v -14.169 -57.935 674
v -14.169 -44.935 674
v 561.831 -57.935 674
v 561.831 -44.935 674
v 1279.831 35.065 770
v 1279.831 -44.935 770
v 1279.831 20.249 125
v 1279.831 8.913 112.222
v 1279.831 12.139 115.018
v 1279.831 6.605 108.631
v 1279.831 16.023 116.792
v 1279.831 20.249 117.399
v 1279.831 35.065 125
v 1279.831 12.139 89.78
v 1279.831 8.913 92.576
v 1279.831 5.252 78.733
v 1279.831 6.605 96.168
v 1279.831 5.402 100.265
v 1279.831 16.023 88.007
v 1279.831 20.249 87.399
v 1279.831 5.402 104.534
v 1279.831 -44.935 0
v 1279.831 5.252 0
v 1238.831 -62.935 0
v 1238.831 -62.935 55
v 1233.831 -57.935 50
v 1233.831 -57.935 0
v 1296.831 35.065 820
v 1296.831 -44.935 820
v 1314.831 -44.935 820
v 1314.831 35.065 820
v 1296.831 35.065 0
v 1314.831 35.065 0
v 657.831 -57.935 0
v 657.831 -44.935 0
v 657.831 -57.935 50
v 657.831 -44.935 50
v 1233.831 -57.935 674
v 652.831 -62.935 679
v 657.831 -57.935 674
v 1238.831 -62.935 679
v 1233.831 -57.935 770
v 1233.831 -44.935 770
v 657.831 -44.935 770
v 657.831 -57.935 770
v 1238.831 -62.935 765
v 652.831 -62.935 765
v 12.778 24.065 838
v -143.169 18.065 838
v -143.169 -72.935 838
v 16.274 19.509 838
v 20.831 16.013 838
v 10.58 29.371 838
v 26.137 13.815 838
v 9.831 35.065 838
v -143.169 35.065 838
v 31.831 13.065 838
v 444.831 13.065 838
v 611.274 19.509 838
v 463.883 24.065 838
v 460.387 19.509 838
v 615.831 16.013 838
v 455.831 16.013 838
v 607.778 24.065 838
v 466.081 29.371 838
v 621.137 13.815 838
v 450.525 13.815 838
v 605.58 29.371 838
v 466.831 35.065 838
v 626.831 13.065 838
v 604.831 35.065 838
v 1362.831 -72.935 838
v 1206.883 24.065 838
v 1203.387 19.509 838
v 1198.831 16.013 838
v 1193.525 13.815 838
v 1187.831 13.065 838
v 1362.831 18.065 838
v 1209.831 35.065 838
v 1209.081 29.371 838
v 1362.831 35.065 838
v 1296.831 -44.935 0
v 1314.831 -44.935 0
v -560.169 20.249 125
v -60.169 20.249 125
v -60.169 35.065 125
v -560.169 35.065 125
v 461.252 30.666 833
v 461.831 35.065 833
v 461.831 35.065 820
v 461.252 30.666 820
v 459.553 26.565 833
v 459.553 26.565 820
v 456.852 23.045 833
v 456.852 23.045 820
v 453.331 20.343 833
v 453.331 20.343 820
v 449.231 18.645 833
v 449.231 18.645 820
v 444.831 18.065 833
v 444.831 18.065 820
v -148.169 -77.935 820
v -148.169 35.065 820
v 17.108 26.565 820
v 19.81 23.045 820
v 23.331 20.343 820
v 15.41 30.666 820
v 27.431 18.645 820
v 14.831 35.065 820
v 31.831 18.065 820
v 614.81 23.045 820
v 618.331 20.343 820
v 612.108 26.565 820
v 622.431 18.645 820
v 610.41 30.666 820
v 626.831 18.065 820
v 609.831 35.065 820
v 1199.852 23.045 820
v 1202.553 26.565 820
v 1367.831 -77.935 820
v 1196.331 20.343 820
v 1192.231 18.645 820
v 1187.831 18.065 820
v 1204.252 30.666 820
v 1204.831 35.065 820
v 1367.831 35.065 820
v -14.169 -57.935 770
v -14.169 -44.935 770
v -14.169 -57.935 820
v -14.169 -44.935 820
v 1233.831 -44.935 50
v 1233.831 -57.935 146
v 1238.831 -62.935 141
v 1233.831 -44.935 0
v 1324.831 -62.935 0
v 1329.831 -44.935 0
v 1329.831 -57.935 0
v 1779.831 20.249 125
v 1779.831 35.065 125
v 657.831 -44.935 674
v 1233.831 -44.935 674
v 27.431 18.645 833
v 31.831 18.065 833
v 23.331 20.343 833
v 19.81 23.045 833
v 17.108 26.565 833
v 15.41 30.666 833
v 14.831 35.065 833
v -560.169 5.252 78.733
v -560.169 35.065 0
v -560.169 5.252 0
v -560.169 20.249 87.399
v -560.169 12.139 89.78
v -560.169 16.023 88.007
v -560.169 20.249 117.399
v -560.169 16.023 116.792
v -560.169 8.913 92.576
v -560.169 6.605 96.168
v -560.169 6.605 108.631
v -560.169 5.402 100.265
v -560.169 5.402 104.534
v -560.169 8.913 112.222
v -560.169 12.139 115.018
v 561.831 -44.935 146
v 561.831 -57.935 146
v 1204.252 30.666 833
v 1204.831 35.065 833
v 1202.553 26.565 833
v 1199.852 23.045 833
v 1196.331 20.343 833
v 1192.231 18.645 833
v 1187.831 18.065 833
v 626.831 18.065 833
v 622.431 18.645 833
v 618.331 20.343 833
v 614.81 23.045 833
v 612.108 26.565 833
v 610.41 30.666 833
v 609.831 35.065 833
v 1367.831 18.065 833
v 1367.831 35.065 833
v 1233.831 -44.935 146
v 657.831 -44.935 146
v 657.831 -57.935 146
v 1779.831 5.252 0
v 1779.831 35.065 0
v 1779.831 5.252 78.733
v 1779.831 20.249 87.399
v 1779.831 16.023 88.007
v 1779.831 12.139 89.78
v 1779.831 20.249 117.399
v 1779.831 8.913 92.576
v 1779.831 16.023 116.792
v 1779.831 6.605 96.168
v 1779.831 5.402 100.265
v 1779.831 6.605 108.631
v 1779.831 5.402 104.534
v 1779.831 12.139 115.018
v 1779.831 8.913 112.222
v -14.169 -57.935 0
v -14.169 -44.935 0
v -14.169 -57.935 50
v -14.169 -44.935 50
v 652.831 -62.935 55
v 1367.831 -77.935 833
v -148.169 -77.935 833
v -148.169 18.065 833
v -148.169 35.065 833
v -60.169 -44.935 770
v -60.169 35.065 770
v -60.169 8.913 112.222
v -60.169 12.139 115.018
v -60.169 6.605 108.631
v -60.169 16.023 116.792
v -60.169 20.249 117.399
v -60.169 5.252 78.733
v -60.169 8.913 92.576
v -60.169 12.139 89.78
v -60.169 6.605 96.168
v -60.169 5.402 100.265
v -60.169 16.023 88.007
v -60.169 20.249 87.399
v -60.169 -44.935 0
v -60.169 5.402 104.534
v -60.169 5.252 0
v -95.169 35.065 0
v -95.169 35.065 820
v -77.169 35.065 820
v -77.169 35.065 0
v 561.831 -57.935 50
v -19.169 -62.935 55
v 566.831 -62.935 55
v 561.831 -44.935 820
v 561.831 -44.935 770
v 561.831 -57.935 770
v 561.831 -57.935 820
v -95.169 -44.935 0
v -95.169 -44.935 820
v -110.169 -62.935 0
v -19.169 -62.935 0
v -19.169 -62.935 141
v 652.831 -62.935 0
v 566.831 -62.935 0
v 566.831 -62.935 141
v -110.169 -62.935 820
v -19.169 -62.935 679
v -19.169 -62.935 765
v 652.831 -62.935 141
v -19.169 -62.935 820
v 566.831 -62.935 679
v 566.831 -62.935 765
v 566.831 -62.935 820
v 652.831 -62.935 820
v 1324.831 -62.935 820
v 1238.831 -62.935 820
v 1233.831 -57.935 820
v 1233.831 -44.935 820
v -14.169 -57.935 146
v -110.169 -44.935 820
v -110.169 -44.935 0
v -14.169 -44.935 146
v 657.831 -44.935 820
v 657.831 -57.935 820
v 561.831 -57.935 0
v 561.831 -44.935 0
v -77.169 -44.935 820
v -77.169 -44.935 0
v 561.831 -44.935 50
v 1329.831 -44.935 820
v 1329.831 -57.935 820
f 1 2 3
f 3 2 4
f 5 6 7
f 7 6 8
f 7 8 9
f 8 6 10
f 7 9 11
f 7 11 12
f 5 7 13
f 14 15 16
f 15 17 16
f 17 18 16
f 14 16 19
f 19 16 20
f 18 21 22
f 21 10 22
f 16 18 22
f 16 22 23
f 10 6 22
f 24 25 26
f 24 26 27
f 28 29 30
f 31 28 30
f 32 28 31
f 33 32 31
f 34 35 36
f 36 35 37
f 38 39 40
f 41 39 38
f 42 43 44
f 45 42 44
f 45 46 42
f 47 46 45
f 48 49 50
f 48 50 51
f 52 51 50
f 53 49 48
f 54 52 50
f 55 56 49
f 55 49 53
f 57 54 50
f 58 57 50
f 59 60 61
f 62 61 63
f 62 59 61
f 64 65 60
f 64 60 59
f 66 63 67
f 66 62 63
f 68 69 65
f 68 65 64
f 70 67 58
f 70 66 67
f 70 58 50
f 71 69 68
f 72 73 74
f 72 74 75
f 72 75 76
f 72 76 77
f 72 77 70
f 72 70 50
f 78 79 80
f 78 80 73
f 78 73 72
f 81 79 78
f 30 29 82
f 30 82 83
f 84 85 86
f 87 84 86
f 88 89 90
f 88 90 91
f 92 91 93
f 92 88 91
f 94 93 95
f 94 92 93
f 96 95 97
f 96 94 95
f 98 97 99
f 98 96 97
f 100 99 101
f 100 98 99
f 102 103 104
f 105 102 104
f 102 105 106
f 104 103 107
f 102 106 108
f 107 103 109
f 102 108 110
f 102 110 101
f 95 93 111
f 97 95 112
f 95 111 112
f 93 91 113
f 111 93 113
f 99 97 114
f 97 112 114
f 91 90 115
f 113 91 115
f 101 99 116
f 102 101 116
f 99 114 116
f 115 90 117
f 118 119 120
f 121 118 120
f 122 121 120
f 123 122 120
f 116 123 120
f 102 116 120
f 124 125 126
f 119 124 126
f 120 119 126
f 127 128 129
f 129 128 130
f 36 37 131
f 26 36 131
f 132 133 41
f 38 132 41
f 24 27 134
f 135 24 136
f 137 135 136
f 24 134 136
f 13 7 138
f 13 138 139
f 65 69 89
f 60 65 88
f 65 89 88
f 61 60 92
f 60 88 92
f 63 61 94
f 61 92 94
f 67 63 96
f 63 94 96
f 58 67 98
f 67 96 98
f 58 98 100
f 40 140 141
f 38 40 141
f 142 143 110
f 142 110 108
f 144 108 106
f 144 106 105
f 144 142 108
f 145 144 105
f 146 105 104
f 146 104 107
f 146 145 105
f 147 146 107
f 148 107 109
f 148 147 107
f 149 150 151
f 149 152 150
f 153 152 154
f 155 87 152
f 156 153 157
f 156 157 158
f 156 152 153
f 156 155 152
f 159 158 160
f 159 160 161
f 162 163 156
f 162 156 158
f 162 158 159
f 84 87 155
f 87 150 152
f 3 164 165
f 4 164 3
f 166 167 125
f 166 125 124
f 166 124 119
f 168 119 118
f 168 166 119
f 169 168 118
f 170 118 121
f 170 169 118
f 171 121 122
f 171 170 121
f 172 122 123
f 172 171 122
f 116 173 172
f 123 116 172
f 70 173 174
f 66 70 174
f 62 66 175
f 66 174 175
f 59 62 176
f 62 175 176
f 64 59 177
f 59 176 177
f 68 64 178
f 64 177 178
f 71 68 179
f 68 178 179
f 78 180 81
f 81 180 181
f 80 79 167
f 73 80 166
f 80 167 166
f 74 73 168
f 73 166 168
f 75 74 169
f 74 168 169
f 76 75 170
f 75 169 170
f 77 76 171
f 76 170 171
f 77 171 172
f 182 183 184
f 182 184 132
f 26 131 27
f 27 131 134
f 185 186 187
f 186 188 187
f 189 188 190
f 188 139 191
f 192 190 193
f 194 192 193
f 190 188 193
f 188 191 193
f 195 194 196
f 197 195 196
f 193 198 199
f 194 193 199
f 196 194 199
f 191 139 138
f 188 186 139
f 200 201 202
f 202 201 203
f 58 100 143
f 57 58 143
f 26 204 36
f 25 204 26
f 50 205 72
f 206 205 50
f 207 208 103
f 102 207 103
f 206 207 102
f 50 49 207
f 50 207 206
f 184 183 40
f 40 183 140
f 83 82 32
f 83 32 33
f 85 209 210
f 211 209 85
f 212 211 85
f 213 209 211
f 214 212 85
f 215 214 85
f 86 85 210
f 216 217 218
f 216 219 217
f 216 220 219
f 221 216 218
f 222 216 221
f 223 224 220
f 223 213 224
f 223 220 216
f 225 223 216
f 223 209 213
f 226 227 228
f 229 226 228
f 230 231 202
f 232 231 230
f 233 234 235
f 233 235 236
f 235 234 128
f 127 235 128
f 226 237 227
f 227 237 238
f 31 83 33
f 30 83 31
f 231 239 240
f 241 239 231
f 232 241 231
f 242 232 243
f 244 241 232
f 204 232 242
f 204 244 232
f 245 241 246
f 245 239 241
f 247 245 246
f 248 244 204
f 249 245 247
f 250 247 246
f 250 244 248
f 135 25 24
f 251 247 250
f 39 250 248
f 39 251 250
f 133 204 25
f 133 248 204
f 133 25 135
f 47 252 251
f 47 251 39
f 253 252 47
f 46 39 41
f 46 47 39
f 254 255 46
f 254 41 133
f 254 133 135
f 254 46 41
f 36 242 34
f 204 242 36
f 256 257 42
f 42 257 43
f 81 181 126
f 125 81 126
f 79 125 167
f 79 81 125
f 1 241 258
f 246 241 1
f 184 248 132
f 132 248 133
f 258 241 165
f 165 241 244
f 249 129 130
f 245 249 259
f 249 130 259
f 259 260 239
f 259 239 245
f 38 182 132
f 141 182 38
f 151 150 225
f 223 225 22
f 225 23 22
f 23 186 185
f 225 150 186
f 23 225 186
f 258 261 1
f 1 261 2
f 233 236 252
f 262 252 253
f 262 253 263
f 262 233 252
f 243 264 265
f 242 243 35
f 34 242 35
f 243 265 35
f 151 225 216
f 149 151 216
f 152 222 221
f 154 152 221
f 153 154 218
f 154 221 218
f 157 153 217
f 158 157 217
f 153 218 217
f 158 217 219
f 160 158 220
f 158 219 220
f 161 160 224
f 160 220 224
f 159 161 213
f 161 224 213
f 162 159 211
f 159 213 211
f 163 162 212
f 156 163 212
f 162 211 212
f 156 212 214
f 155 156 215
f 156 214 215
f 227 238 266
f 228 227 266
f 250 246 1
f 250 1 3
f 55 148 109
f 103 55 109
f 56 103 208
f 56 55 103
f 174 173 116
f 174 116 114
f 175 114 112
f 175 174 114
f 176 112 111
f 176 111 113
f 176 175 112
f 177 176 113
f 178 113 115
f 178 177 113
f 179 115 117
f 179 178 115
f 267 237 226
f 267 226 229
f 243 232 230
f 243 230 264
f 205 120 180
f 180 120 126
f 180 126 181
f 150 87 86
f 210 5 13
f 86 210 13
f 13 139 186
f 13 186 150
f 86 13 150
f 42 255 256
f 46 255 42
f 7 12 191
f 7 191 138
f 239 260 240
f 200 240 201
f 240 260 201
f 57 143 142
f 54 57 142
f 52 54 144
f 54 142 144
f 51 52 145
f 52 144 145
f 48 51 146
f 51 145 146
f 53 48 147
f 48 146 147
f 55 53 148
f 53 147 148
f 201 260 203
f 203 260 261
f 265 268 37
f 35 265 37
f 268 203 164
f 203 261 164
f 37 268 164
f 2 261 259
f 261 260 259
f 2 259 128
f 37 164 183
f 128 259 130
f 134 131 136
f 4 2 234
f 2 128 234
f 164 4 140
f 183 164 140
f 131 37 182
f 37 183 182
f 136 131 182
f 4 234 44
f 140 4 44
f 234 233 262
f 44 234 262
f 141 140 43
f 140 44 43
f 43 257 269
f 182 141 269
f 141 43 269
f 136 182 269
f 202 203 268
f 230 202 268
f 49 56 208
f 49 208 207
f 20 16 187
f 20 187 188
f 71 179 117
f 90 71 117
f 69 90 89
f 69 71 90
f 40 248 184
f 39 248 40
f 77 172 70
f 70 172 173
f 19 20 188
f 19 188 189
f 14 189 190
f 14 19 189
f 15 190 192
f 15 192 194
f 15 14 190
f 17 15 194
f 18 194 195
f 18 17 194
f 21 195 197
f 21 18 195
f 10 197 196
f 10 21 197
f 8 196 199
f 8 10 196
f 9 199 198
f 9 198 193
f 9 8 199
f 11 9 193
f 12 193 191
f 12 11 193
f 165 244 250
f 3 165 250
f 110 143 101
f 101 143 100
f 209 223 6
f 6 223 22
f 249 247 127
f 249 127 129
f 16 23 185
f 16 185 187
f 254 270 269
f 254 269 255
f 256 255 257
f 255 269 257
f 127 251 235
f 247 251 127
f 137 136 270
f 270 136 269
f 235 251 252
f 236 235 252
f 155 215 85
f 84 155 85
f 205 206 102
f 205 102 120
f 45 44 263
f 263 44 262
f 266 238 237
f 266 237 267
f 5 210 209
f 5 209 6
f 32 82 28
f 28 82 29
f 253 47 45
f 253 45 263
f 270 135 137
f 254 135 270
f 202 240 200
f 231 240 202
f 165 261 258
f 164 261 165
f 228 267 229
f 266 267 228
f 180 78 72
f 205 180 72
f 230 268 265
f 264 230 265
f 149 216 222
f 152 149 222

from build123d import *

# Parameters (mm, degrees)
F0_W          = 1340
F0_H          = 80
F1_DEPTH      = 770
F3_DEPTH      = 500
F3_DEPTH_BACK = 1840
F4_W          = 15
F4_H          = 820
F4_W_2        = 576
F4_H_2        = 528
F4_W_3        = 96
F4_H_3        = 50
F4_W_4        = 18
F5_DEPTH      = 18
F6_SIZE       = 5
F7_DEPTH      = 63
F7_DEPTH_BACK = 33
F8_SIZE       = 5
F9_DEPTH      = 80
F11_DEPTH     = 18
F12_SIZE      = 4.99999


# Not quite as in the source:
# - a fillet or chamfer is up to 0.001 mm smaller than in the source, because OpenCascade refuses the exact size


with BuildPart() as f1:
    # F0 (on Top) → F1 (new body)
    with BuildSketch(Plane.XY):
        with Locations((609.8307800293, -4.9345558882)):
            Rectangle(F0_W, F0_H)
    extrude(amount=F1_DEPTH)

    # F2 (on face) → F3 (join, two sides)
    with BuildSketch(Plane(origin=(-60.1692199707, 0, 0), x_dir=(0, -1, 0), z_dir=(-1, 0, 0))) as f3_sk:
        with BuildLine():
            Line((-35.0654441118, 125), (-35.0654441118, 0))
            Line((-35.0654441118, 0), (-5.2516935417, 0))
            Line((-5.2516935417, 0), (-5.2516935417, 78.7325807151))
            Line((-5.2516935417, 78.7325807151), (-20.2490844093, 87.3992991551))
            ThreePointArc((-20.2490844093, 87.3992991551), (-5.2490844093, 102.3992991551), (-20.2490844093, 117.3992991551))
            Line((-20.2490844093, 117.3992991551), (-20.2490844093, 125))
            Line((-20.2490844093, 125), (-35.0654441118, 125))
        make_face()
    extrude(amount=F3_DEPTH)
    extrude(f3_sk.sketch, amount=-F3_DEPTH_BACK)


with BuildPart() as f5:
    # F4 (on face) → F5 (new body)
    with BuildSketch(Plane.XZ.offset(44.9345558882)):
        with Locations((-102.6692199707, 410)):
            Rectangle(F4_W, F4_H)
        Polygon((657.8307800293, 770), (561.8307800293, 770), (-14.1692199707, 770), (-60.1692199707, 770), (-60.1692199707, 0), (-14.1692199707, 0), (-14.1692199707, 50), (561.8307800293, 50), (561.8307800293, 0), (657.8307800293, 0), (657.8307800293, 50), (1233.8307800293, 50), (1233.8307800293, 0), (1279.8307800293, 0), (1279.8307800293, 770), (1233.8307800293, 770), align=None)
        with Locations((273.8307800293, 410)):
            Rectangle(F4_W_2, F4_H_2, mode=Mode.SUBTRACT)
        with Locations((945.8307800293, 410)):
            Rectangle(F4_W_2, F4_H_2, mode=Mode.SUBTRACT)
        with Locations((609.8307800293, 795)):
            Rectangle(F4_W_3, F4_H_3)
        with Locations((1322.3307800293, 410)):
            Rectangle(F4_W, F4_H)
        Polygon((-14.1692199707, 770), (-14.1692199707, 820), (-77.1692199707, 820), (-77.1692199707, 0), (-60.1692199707, 0), (-60.1692199707, 770), align=None)
        with Locations((-86.1692199707, 410)):
            Rectangle(F4_W_4, F4_H)
        Polygon((1296.8307800293, 820), (1233.8307800293, 820), (1233.8307800293, 770), (1279.8307800293, 770), (1279.8307800293, 0), (1296.8307800293, 0), align=None)
        with Locations((1305.8307800293, 410)):
            Rectangle(F4_W_4, F4_H)
    extrude(amount=F5_DEPTH)

    # F6
    f6_edges = [f5.edges().sort_by_distance(p)[0] for p in [
        (-14.16922, -62.934556, 795),
        (273.83078, -62.934556, 770),
        (561.83078, -62.934556, 795),
        (657.83078, -62.934556, 795),
        (945.83078, -62.934556, 770),
        (1233.83078, -62.934556, 795),
        (1233.83078, -62.934556, 410),
        (945.83078, -62.934556, 674),
        (657.83078, -62.934556, 410),
        (945.83078, -62.934556, 146),
        (561.83078, -62.934556, 410),
        (273.83078, -62.934556, 674),
        (-14.16922, -62.934556, 410),
        (273.83078, -62.934556, 146),
        (-14.16922, -62.934556, 25),
        (273.83078, -62.934556, 50),
        (561.83078, -62.934556, 25),
        (657.83078, -62.934556, 25),
        (945.83078, -62.934556, 50),
        (1233.83078, -62.934556, 25),
        (1329.83078, -62.934556, 410),
    ]]
    chamfer(f6_edges, length=F6_SIZE)


with BuildPart() as f7:
    # F4 (on face) → F7 (new body, two sides)
    with BuildSketch(Plane.XZ.offset(44.9345558882)) as f7_sk:
        Polygon((-14.1692199707, 820), (561.8307800293, 820), (657.8307800293, 820), (1233.8307800293, 820), (1296.8307800293, 820), (1314.8307800293, 820), (1329.8307800293, 820), (1367.8307800293, 820), (1367.8307800293, 838), (-148.1692199707, 838), (-148.1692199707, 820), (-110.1692199707, 820), (-95.1692199707, 820), (-77.1692199707, 820), align=None)
    extrude(amount=-F7_DEPTH)
    extrude(f7_sk.sketch, amount=F7_DEPTH_BACK)

    # F8
    f8_edges = [f7.edges().sort_by_distance(p)[0] for p in [
        (-148.16922, -29.934556, 838),
        (609.83078, -77.934556, 838),
        (1367.83078, -29.934556, 838),
    ]]
    chamfer(f8_edges, length=F8_SIZE)

    # F10 (on face) → F11 (join)
    with BuildSketch(Plane.XY.offset(838)):
        with BuildLine():
            Line((-60.1692199707, 35.0654441118), (-148.1692199707, 35.0654441118))
            Line((-148.1692199707, 35.0654441118), (-148.1692199707, 18.0654441118))
            Line((-148.1692199707, 18.0654441118), (-143.1692199707, 18.0654441118))
            Line((-143.1692199707, 18.0654441118), (31.8307800574, 18.0654441118))
            ThreePointArc((31.8307800574, 18.0654441118), (19.8099647591, 23.0446288217), (14.8307800293, 35.0654441118))
            Line((14.8307800293, 35.0654441118), (-60.1692199707, 35.0654441118))
        make_face()
        with BuildLine():
            ThreePointArc((461.8307800293, 35.0654441118), (456.8515952122, 23.0446287344), (444.8307797541, 18.0654441118))
            Line((444.8307797541, 18.0654441118), (626.8307800293, 18.0654441118))
            ThreePointArc((626.8307800293, 18.0654441118), (614.8099647491, 23.0446288317), (609.8307800293, 35.0654441118))
            Line((609.8307800293, 35.0654441118), (461.8307800293, 35.0654441118))
        make_face()
        with BuildLine():
            Line((1187.8307800293, 18.0654441118), (1362.8307800293, 18.0654441118))
            Line((1362.8307800293, 18.0654441118), (1367.8307800293, 18.0654441118))
            Line((1367.8307800293, 18.0654441118), (1367.8307800293, 35.0654441118))
            Line((1367.8307800293, 35.0654441118), (1279.8307800293, 35.0654441118))
            Line((1279.8307800293, 35.0654441118), (1204.8307800293, 35.0654441118))
            ThreePointArc((1204.8307800293, 35.0654441118), (1199.8515953095, 23.0446288317), (1187.8307800293, 18.0654441118))
        make_face()
    extrude(amount=-F11_DEPTH)

    # F12 (size 5 in the source; OpenCascade refuses exactly that, so slightly less here)
    f12_edges = [f7.edges().sort_by_distance(p)[0] for p in [
        (1367.83078, 26.565444, 838),
        (1199.851595, 23.044629, 838),
        (456.851595, 23.044629, 838),
        (-148.16922, 26.565444, 838),
    ]]
    chamfer(f12_edges, length=F12_SIZE)


with BuildPart() as f9:
    # F4 (on face) → F9 (new body)
    with BuildSketch(Plane.XZ.offset(44.9345558882)):
        with Locations((-86.1692199707, 410)):
            Rectangle(F4_W_4, F4_H)
    extrude(amount=-F9_DEPTH)


with BuildPart() as f9b:
    # F4 (on face) → F9, piece 2 (new body)
    with BuildSketch(Plane.XZ.offset(44.9345558882)):
        with Locations((1305.8307800293, 410)):
            Rectangle(F4_W_4, F4_H)
    extrude(amount=-F9_DEPTH)


solid = Compound([f1.part, f5.part, f7.part, f9.part, f9b.part])
